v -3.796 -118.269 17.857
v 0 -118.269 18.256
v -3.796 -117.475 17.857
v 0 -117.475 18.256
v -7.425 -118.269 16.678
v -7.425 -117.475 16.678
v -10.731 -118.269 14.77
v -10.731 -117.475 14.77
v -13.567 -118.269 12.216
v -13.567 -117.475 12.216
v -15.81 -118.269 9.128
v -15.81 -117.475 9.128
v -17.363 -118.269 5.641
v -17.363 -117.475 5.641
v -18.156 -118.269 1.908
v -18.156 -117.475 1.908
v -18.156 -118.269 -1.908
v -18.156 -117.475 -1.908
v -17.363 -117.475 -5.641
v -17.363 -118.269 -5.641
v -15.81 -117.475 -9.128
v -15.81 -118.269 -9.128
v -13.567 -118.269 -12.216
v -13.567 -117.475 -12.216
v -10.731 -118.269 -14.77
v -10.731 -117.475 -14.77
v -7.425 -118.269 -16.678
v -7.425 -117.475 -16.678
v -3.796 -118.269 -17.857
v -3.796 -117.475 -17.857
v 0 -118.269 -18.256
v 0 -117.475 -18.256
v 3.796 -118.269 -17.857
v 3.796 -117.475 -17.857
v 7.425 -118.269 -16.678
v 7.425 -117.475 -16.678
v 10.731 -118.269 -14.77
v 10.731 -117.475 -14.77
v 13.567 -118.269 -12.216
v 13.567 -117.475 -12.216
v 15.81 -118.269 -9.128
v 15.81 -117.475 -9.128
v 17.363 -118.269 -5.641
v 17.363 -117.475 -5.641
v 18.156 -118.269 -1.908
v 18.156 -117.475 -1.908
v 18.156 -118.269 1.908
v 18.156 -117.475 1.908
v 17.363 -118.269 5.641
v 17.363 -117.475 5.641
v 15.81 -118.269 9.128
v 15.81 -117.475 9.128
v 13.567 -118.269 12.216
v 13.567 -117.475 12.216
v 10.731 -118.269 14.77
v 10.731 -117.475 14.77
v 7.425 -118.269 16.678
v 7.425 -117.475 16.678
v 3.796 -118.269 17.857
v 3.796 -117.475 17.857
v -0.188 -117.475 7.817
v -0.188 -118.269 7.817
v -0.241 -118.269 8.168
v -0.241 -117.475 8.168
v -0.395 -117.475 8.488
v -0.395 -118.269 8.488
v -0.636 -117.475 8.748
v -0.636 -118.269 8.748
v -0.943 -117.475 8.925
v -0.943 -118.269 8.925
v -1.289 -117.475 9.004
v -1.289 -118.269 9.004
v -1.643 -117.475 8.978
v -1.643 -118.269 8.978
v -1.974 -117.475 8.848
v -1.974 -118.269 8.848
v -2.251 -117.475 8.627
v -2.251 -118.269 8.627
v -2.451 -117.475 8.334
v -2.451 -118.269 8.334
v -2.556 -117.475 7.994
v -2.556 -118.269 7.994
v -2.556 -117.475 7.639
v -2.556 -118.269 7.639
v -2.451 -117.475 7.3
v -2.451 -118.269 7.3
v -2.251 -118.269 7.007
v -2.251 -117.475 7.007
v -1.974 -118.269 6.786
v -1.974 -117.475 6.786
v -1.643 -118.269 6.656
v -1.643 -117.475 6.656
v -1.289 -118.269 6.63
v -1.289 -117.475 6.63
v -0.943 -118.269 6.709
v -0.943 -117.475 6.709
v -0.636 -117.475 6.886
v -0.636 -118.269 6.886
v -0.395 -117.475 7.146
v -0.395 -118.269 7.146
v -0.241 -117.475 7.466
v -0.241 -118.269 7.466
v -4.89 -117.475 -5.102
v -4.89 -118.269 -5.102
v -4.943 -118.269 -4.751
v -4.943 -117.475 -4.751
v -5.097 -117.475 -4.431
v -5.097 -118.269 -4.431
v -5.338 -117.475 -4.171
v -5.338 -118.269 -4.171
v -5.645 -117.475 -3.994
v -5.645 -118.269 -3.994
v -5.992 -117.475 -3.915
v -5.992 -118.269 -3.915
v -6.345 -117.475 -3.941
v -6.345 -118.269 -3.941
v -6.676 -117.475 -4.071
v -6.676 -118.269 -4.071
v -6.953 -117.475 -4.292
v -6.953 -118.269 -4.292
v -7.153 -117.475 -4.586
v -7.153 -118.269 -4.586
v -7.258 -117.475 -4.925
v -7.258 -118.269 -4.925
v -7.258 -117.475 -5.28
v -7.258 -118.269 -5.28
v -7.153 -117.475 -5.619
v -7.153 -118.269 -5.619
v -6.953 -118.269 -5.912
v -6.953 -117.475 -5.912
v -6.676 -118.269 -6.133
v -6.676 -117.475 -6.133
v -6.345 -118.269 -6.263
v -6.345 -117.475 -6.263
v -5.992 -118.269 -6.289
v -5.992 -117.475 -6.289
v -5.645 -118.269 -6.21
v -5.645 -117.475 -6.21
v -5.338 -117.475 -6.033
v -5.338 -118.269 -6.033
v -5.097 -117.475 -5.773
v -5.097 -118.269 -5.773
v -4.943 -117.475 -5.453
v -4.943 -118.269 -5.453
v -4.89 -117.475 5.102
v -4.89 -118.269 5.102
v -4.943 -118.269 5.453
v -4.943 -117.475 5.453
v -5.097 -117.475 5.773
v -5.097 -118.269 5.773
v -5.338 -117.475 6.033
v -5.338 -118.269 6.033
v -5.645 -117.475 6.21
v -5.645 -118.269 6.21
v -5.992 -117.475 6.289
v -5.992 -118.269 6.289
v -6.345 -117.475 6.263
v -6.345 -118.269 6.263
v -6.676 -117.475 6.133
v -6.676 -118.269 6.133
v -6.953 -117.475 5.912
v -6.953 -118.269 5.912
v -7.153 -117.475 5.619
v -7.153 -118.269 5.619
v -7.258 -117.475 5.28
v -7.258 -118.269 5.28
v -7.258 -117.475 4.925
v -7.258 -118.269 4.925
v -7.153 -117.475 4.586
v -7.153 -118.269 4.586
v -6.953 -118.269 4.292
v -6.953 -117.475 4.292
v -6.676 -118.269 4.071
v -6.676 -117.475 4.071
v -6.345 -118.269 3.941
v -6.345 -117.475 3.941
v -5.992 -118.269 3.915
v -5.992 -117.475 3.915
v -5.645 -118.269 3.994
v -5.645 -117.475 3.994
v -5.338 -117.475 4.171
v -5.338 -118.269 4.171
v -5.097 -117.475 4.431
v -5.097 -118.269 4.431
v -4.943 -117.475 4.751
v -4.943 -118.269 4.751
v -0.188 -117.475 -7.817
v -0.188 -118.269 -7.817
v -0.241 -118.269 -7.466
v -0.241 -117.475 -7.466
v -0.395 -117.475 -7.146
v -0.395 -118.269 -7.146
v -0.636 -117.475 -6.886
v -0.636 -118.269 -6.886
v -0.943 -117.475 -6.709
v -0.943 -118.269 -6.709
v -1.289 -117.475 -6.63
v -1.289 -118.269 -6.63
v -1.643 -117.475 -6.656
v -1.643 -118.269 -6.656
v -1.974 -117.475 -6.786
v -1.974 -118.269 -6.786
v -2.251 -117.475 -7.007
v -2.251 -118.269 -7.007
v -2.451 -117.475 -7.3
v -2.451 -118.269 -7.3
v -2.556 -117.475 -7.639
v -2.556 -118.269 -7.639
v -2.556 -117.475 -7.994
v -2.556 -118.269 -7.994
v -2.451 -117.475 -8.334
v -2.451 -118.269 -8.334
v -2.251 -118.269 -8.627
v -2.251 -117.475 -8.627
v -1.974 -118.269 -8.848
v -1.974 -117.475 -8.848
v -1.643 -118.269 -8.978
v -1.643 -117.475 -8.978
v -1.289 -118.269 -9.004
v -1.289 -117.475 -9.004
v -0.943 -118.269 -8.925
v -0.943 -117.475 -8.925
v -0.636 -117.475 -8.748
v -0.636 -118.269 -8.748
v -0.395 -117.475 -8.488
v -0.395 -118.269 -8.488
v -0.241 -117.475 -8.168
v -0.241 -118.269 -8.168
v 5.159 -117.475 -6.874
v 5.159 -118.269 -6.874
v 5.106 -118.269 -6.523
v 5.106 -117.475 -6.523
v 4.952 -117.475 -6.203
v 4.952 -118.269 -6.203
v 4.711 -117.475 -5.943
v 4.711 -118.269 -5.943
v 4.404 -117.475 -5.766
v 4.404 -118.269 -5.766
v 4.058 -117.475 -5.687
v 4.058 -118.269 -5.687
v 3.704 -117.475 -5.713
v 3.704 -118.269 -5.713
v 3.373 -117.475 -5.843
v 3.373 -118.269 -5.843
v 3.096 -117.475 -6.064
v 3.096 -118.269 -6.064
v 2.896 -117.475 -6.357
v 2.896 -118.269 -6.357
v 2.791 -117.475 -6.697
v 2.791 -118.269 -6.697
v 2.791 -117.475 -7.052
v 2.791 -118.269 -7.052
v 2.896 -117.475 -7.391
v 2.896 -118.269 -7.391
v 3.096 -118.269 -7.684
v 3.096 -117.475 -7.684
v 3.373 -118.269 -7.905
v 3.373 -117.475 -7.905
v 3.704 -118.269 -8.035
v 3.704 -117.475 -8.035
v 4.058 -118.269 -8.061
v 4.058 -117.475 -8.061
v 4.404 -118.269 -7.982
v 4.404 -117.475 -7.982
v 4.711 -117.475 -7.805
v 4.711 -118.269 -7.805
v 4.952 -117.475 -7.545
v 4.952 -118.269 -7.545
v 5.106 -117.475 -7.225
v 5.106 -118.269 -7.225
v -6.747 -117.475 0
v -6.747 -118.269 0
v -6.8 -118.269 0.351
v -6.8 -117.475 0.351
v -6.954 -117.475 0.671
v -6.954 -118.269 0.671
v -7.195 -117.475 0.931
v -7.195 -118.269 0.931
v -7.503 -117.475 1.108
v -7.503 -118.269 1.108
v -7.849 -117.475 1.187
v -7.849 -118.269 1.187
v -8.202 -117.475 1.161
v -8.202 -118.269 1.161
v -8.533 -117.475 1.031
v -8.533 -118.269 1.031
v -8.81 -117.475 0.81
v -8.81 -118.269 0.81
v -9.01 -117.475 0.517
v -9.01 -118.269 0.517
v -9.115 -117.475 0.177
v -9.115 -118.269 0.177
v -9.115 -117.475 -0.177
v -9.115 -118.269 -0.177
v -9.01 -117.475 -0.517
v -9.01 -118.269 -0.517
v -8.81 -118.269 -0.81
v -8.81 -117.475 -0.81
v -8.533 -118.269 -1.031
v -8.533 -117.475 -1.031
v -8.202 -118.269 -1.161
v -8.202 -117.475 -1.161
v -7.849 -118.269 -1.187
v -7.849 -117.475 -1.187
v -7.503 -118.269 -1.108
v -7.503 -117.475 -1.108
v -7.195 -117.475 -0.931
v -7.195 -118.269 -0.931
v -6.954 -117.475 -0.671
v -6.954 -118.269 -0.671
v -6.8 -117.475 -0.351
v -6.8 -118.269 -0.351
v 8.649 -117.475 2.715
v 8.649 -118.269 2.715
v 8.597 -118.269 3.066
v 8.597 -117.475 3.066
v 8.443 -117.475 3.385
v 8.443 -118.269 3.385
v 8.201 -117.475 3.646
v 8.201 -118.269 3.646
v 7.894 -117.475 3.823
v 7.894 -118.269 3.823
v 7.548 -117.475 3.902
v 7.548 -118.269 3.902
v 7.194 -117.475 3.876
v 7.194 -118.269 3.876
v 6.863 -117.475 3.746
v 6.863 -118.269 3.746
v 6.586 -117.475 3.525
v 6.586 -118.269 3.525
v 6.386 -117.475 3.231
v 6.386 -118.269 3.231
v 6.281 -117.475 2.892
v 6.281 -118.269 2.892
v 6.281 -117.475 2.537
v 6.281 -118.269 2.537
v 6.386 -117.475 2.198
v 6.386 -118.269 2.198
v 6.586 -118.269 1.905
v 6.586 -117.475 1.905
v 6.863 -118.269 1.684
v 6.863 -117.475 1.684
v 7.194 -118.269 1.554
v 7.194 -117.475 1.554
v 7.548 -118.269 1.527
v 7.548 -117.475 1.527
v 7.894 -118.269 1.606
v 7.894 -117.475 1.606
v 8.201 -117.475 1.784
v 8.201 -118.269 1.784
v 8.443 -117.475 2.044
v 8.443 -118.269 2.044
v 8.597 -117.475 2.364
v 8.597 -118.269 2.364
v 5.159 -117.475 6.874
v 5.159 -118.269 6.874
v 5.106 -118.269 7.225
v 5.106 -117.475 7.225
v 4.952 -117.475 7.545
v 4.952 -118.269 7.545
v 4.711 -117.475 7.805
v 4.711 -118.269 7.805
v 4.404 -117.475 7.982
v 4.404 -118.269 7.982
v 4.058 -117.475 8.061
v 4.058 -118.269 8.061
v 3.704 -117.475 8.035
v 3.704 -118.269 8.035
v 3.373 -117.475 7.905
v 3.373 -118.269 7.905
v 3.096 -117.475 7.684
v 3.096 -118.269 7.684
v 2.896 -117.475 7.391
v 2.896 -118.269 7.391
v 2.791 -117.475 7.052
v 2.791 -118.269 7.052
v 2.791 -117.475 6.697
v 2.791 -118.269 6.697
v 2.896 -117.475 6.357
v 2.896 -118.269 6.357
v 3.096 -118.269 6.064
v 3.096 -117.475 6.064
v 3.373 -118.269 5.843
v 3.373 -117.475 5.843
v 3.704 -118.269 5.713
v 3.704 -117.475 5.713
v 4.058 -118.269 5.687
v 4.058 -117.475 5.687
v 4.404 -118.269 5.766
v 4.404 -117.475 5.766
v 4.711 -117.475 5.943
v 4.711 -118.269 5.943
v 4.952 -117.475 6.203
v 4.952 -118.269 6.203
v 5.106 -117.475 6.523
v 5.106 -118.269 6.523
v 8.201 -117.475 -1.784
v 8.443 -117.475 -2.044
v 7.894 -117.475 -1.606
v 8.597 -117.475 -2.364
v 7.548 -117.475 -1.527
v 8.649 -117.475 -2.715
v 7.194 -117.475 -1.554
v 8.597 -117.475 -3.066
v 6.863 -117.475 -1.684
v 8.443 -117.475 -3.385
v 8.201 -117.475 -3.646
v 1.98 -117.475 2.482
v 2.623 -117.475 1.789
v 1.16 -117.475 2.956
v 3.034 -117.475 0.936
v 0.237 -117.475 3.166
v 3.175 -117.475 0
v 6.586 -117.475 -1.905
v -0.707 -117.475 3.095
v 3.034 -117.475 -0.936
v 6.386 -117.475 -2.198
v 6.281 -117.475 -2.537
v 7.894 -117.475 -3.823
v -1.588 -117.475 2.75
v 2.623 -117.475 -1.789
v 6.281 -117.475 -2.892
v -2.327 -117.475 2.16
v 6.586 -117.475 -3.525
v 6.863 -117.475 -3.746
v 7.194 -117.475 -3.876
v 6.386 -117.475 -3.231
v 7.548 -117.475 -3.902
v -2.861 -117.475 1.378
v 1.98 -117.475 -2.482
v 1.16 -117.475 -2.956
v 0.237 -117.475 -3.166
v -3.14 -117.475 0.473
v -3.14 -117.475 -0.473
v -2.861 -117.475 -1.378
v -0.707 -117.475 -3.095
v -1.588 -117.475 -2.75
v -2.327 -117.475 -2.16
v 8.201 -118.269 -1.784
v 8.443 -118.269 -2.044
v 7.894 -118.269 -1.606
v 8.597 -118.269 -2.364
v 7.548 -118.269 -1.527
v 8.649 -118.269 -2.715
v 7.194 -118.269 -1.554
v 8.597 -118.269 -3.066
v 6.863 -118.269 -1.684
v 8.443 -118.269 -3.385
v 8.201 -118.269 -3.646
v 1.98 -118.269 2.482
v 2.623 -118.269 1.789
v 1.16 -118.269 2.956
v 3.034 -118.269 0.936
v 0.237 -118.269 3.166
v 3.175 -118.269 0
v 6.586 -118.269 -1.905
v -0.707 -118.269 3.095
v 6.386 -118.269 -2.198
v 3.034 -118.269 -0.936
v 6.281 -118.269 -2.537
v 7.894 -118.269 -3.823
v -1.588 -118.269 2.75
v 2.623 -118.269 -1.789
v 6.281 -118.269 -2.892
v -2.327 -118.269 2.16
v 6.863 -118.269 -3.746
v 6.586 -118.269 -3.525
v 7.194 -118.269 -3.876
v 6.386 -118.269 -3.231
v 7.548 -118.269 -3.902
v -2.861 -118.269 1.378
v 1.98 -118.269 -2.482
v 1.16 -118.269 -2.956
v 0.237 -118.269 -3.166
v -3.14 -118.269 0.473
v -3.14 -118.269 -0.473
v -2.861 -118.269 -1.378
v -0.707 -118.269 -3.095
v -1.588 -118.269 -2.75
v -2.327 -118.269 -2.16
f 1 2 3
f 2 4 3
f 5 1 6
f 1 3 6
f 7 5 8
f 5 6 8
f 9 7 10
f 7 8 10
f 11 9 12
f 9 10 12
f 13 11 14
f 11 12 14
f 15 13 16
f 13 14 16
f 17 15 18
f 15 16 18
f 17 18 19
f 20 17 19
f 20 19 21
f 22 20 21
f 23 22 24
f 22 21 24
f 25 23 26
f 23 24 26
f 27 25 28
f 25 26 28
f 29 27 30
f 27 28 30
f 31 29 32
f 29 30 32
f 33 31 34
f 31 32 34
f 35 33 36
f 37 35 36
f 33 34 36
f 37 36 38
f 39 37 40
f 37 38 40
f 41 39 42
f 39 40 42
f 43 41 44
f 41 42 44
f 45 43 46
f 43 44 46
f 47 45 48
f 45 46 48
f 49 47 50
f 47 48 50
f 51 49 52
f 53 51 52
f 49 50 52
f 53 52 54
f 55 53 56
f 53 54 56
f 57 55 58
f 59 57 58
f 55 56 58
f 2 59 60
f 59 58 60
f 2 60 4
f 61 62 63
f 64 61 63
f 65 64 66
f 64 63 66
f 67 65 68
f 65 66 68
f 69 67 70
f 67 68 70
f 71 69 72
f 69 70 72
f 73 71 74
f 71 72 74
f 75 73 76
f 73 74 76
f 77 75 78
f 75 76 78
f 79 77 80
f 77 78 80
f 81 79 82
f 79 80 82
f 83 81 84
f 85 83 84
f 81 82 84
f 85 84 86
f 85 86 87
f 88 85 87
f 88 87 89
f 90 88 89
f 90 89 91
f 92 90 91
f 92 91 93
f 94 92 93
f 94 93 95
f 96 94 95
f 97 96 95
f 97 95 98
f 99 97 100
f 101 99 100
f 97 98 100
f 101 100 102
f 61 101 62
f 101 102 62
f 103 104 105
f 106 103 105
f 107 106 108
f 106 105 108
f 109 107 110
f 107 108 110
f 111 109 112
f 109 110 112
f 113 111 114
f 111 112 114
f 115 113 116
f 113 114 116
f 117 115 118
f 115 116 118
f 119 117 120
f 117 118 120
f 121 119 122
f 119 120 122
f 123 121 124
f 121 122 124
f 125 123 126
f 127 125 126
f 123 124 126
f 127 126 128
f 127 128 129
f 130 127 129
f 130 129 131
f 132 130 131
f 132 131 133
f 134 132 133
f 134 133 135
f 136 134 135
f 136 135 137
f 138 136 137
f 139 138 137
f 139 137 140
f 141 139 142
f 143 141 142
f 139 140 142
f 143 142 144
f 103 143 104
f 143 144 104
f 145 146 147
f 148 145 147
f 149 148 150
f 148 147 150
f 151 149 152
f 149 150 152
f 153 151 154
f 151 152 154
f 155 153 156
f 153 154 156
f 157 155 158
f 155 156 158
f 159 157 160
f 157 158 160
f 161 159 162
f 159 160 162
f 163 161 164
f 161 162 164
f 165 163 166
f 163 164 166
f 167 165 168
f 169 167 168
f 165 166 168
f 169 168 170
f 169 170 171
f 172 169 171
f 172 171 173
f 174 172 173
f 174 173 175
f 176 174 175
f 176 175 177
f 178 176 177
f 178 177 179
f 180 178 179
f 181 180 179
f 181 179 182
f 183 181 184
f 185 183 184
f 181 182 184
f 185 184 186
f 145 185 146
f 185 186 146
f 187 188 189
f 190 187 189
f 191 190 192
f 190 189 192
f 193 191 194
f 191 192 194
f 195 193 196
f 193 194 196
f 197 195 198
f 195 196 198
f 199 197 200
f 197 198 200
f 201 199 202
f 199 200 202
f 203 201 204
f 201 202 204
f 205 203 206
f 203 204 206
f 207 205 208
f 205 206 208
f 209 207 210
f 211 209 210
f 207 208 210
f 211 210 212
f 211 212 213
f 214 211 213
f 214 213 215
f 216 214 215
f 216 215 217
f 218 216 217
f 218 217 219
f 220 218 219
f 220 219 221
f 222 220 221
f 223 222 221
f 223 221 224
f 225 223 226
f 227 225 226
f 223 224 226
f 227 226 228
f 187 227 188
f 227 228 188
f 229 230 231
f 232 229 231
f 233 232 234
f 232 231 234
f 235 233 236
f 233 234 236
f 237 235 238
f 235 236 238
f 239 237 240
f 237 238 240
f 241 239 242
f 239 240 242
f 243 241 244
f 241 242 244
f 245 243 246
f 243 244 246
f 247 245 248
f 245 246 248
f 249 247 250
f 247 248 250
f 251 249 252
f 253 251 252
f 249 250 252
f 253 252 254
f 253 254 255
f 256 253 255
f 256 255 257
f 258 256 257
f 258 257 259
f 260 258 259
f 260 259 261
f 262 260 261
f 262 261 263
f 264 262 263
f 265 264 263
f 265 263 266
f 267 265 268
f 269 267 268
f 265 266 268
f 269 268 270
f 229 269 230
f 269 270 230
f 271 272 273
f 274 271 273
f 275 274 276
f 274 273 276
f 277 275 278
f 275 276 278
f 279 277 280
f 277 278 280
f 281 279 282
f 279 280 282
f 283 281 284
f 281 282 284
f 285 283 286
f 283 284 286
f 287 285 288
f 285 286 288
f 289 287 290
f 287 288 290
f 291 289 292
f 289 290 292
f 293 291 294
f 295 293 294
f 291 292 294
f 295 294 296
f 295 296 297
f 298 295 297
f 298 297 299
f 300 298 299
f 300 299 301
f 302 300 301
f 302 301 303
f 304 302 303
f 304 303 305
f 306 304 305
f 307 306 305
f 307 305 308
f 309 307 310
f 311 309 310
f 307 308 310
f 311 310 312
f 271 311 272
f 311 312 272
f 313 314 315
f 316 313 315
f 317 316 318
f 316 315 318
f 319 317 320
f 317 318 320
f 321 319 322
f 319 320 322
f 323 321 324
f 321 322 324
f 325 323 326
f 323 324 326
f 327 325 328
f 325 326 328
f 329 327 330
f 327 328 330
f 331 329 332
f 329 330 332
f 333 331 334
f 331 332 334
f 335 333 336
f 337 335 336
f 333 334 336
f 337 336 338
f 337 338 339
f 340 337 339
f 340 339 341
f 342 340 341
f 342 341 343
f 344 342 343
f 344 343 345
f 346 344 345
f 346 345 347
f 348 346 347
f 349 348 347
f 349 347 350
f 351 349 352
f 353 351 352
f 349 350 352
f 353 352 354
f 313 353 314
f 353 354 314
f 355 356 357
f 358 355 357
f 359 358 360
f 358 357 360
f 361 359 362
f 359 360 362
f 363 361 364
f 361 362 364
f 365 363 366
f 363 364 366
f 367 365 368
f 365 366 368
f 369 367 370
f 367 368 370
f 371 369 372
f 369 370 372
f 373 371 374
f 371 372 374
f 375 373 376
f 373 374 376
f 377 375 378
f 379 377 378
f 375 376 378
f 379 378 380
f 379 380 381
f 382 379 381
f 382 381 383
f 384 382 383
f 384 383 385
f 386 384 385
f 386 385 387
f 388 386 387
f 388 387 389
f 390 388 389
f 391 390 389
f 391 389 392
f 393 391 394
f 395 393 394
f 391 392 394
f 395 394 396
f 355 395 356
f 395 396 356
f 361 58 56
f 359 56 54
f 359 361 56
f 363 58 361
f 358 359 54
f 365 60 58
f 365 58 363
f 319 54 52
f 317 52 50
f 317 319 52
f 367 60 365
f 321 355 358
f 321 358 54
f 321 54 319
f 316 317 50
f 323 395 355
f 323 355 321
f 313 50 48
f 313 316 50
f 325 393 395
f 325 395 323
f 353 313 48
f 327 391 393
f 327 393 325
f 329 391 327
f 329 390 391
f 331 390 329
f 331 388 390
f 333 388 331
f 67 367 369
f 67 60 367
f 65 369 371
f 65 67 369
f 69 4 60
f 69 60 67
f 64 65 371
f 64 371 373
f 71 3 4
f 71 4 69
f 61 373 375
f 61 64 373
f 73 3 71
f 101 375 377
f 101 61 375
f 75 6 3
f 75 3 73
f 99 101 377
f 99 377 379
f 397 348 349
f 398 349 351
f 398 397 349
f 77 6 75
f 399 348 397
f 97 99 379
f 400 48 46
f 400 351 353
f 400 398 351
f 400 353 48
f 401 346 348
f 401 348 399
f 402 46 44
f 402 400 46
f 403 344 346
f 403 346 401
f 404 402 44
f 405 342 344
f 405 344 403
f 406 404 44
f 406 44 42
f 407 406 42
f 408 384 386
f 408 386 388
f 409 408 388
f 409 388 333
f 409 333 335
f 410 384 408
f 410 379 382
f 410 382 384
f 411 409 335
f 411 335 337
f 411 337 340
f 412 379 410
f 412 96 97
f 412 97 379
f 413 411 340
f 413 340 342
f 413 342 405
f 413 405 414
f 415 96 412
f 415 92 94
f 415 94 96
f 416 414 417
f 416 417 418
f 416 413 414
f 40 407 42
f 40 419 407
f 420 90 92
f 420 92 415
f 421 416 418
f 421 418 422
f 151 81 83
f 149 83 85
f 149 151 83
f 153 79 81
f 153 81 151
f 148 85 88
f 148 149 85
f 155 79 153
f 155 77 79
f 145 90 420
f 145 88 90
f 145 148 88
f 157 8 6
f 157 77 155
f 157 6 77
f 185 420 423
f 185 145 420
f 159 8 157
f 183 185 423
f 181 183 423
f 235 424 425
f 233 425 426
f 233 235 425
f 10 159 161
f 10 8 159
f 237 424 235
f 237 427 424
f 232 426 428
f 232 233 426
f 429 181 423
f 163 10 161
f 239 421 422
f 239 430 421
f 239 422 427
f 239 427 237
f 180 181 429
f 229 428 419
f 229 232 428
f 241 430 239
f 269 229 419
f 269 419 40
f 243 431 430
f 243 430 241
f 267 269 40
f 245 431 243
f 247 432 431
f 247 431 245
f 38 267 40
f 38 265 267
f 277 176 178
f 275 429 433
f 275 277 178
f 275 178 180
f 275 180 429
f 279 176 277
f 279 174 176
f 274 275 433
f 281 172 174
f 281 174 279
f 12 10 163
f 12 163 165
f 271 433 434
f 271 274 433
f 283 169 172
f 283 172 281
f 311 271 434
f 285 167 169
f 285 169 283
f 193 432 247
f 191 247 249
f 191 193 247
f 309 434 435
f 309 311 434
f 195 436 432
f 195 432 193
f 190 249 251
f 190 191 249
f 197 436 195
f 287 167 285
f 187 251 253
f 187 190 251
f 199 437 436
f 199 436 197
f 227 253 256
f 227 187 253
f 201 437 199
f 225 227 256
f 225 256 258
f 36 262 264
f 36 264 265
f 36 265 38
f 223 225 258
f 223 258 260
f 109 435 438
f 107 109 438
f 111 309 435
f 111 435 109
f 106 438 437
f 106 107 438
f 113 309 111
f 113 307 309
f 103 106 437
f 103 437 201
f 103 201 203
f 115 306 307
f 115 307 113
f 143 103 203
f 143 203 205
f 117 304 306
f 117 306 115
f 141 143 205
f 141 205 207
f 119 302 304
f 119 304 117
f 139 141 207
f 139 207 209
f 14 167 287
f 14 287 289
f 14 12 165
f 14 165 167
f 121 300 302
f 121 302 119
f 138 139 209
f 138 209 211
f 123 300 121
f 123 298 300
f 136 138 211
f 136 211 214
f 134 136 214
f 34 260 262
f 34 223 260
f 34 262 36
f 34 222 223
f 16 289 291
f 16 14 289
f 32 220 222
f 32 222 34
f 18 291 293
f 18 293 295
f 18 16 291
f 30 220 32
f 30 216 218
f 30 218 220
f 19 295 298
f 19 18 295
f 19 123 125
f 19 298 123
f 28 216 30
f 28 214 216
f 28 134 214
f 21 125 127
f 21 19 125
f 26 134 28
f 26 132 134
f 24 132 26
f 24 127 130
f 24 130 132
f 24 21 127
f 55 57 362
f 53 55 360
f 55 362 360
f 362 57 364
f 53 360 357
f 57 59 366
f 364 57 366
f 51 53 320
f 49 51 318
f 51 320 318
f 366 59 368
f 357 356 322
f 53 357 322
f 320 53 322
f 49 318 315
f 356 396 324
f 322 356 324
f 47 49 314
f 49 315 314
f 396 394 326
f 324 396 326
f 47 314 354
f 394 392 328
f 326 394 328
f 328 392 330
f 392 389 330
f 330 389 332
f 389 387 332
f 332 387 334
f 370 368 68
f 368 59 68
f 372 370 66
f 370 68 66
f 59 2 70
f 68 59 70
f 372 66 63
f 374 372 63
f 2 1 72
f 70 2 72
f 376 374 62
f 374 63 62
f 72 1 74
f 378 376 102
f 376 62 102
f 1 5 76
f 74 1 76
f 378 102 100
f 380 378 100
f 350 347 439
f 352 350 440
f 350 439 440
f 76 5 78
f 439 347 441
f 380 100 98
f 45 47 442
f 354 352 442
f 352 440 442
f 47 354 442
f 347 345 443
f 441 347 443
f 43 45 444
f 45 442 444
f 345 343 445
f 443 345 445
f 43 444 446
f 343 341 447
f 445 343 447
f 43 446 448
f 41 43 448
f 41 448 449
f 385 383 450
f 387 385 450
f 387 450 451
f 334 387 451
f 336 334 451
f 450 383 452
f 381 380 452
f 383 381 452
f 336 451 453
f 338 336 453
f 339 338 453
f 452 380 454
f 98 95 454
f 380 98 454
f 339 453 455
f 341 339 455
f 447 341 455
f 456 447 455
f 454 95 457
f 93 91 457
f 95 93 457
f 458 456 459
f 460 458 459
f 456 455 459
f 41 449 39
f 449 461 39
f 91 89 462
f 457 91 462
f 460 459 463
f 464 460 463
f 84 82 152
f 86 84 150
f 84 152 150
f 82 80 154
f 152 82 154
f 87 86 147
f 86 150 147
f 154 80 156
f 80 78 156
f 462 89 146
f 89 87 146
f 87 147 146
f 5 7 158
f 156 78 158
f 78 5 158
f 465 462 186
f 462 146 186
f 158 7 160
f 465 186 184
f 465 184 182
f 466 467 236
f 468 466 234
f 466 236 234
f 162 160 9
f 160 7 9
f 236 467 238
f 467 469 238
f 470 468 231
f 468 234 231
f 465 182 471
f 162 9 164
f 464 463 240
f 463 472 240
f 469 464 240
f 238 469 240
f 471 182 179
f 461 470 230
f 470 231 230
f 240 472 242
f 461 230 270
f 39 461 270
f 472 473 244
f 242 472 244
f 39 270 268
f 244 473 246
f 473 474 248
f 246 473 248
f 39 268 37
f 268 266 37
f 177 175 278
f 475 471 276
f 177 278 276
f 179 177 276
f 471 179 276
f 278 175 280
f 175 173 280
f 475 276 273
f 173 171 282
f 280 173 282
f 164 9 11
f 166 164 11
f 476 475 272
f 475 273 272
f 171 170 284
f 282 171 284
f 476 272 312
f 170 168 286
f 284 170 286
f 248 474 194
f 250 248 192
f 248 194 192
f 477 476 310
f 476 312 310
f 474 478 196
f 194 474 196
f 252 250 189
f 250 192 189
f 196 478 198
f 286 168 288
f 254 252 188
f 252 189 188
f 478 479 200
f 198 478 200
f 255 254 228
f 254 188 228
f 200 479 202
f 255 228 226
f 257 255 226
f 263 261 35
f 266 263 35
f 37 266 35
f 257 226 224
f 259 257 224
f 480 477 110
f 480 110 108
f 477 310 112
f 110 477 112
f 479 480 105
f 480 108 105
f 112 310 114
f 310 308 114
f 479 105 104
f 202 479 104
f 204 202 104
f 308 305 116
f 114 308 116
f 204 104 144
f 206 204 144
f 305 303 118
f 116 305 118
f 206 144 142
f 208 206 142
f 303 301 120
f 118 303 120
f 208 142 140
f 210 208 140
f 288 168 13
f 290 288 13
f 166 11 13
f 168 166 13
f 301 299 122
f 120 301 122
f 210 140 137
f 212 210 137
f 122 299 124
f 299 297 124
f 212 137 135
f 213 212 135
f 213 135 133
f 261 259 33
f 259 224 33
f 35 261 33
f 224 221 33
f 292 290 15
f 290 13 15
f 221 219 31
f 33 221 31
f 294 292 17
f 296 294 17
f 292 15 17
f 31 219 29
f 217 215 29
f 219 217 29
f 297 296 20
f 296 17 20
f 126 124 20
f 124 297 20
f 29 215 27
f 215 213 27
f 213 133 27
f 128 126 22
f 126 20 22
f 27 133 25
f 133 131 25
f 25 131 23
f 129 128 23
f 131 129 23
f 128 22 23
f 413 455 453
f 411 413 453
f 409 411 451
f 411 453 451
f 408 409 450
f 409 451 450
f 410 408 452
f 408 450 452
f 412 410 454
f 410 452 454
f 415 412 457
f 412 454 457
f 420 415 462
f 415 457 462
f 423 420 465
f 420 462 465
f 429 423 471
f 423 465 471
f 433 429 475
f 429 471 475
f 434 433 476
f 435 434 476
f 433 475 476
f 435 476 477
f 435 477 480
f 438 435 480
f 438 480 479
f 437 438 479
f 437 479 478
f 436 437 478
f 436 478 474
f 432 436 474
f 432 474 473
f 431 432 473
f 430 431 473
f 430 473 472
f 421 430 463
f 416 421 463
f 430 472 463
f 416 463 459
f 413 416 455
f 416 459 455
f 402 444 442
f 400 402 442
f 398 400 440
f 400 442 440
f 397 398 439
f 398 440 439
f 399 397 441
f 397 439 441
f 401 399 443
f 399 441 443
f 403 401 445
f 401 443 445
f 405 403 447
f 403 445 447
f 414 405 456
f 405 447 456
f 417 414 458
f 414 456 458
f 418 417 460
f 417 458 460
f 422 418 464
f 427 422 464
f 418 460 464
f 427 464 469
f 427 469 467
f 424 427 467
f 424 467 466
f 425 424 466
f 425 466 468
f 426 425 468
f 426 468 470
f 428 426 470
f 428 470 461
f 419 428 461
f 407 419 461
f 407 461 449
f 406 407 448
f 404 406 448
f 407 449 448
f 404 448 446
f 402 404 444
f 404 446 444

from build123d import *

# Parameters (mm, degrees)
F0_W     = 0.79375
F0_H     = 18.25625
F2_R     = 3.175
F2_R_2   = 1.190625
F3_DEPTH = 0.79375


with BuildPart() as f1:
    # F0 (on Right) → F1 (revolve)
    with BuildSketch(Plane.YZ):
        with Locations((-117.871875, 9.128125)):
            Rectangle(F0_W, F0_H)
    revolve(axis=Axis((0, -58.7375, 0), (0, -1, 0)))

    # F2 (on face) → F3 (cut, through all)
    with BuildSketch(Plane.XZ.offset(118.26875)):
        Circle(F2_R)
        with Locations((-7.9375, 0)):
            Circle(F2_R_2)
        with Locations((-6.080478, -5.102127)):
            Circle(F2_R_2)
        with Locations((-1.378332, -7.816912)):
            Circle(F2_R_2)
        with Locations((3.96875, -6.874077)):
            Circle(F2_R_2)
        with Locations((7.45881, -2.714785)):
            Circle(F2_R_2)
        with Locations((7.45881, 2.714785)):
            Circle(F2_R_2)
        with Locations((3.96875, 6.874077)):
            Circle(F2_R_2)
        with Locations((-1.378332, 7.816912)):
            Circle(F2_R_2)
        with Locations((-6.080478, 5.102127)):
            Circle(F2_R_2)
    extrude(amount=-F3_DEPTH, mode=Mode.SUBTRACT)


solid = f1.part
